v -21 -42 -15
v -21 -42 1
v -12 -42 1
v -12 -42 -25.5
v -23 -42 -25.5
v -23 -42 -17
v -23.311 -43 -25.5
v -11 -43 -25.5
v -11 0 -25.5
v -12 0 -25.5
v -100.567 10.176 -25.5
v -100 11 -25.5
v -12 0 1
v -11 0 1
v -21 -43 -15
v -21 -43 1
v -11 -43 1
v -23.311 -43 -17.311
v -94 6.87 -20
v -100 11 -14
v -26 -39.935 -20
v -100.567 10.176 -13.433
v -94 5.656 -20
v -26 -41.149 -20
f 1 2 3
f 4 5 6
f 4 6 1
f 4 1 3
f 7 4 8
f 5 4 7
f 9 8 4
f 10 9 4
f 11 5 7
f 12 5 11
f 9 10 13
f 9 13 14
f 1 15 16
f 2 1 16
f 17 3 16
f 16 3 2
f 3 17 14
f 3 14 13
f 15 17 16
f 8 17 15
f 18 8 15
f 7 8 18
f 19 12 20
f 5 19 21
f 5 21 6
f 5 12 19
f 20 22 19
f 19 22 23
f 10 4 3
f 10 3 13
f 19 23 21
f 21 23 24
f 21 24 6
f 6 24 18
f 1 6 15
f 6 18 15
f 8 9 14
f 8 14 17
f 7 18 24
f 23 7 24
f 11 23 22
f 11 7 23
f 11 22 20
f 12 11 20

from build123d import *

# Parameters (mm, degrees)
EXTRUDE018_DEPTH = 60
EXTRUDE016_DEPTH = 26.5


with BuildPart() as body013:
    # Sketch022 → Extrude018 (new body)
    with BuildSketch(Plane.XZ.offset(46)):
        Polygon((-21, 7.5), (-102, 7.5), (-102, -12), (-94, -20), (-26, -20), (-21, -15), align=None)
    extrude(amount=-EXTRUDE018_DEPTH)


with BuildPart() as cut008:
    # Sketch020 → Extrude016 (new body)
    with BuildSketch(Plane.XY.offset(-25.5)):
        Polygon((-11, 0), (-11, -43), (-23.310892, -43), (-100.566983, 10.17627), (-100, 11), (-23, -42), (-12, -42), (-12, 0), align=None)
    extrude(amount=EXTRUDE016_DEPTH)

    # Cut008: cut Body013
    add(body013.part, mode=Mode.SUBTRACT)


solid = cut008.part
